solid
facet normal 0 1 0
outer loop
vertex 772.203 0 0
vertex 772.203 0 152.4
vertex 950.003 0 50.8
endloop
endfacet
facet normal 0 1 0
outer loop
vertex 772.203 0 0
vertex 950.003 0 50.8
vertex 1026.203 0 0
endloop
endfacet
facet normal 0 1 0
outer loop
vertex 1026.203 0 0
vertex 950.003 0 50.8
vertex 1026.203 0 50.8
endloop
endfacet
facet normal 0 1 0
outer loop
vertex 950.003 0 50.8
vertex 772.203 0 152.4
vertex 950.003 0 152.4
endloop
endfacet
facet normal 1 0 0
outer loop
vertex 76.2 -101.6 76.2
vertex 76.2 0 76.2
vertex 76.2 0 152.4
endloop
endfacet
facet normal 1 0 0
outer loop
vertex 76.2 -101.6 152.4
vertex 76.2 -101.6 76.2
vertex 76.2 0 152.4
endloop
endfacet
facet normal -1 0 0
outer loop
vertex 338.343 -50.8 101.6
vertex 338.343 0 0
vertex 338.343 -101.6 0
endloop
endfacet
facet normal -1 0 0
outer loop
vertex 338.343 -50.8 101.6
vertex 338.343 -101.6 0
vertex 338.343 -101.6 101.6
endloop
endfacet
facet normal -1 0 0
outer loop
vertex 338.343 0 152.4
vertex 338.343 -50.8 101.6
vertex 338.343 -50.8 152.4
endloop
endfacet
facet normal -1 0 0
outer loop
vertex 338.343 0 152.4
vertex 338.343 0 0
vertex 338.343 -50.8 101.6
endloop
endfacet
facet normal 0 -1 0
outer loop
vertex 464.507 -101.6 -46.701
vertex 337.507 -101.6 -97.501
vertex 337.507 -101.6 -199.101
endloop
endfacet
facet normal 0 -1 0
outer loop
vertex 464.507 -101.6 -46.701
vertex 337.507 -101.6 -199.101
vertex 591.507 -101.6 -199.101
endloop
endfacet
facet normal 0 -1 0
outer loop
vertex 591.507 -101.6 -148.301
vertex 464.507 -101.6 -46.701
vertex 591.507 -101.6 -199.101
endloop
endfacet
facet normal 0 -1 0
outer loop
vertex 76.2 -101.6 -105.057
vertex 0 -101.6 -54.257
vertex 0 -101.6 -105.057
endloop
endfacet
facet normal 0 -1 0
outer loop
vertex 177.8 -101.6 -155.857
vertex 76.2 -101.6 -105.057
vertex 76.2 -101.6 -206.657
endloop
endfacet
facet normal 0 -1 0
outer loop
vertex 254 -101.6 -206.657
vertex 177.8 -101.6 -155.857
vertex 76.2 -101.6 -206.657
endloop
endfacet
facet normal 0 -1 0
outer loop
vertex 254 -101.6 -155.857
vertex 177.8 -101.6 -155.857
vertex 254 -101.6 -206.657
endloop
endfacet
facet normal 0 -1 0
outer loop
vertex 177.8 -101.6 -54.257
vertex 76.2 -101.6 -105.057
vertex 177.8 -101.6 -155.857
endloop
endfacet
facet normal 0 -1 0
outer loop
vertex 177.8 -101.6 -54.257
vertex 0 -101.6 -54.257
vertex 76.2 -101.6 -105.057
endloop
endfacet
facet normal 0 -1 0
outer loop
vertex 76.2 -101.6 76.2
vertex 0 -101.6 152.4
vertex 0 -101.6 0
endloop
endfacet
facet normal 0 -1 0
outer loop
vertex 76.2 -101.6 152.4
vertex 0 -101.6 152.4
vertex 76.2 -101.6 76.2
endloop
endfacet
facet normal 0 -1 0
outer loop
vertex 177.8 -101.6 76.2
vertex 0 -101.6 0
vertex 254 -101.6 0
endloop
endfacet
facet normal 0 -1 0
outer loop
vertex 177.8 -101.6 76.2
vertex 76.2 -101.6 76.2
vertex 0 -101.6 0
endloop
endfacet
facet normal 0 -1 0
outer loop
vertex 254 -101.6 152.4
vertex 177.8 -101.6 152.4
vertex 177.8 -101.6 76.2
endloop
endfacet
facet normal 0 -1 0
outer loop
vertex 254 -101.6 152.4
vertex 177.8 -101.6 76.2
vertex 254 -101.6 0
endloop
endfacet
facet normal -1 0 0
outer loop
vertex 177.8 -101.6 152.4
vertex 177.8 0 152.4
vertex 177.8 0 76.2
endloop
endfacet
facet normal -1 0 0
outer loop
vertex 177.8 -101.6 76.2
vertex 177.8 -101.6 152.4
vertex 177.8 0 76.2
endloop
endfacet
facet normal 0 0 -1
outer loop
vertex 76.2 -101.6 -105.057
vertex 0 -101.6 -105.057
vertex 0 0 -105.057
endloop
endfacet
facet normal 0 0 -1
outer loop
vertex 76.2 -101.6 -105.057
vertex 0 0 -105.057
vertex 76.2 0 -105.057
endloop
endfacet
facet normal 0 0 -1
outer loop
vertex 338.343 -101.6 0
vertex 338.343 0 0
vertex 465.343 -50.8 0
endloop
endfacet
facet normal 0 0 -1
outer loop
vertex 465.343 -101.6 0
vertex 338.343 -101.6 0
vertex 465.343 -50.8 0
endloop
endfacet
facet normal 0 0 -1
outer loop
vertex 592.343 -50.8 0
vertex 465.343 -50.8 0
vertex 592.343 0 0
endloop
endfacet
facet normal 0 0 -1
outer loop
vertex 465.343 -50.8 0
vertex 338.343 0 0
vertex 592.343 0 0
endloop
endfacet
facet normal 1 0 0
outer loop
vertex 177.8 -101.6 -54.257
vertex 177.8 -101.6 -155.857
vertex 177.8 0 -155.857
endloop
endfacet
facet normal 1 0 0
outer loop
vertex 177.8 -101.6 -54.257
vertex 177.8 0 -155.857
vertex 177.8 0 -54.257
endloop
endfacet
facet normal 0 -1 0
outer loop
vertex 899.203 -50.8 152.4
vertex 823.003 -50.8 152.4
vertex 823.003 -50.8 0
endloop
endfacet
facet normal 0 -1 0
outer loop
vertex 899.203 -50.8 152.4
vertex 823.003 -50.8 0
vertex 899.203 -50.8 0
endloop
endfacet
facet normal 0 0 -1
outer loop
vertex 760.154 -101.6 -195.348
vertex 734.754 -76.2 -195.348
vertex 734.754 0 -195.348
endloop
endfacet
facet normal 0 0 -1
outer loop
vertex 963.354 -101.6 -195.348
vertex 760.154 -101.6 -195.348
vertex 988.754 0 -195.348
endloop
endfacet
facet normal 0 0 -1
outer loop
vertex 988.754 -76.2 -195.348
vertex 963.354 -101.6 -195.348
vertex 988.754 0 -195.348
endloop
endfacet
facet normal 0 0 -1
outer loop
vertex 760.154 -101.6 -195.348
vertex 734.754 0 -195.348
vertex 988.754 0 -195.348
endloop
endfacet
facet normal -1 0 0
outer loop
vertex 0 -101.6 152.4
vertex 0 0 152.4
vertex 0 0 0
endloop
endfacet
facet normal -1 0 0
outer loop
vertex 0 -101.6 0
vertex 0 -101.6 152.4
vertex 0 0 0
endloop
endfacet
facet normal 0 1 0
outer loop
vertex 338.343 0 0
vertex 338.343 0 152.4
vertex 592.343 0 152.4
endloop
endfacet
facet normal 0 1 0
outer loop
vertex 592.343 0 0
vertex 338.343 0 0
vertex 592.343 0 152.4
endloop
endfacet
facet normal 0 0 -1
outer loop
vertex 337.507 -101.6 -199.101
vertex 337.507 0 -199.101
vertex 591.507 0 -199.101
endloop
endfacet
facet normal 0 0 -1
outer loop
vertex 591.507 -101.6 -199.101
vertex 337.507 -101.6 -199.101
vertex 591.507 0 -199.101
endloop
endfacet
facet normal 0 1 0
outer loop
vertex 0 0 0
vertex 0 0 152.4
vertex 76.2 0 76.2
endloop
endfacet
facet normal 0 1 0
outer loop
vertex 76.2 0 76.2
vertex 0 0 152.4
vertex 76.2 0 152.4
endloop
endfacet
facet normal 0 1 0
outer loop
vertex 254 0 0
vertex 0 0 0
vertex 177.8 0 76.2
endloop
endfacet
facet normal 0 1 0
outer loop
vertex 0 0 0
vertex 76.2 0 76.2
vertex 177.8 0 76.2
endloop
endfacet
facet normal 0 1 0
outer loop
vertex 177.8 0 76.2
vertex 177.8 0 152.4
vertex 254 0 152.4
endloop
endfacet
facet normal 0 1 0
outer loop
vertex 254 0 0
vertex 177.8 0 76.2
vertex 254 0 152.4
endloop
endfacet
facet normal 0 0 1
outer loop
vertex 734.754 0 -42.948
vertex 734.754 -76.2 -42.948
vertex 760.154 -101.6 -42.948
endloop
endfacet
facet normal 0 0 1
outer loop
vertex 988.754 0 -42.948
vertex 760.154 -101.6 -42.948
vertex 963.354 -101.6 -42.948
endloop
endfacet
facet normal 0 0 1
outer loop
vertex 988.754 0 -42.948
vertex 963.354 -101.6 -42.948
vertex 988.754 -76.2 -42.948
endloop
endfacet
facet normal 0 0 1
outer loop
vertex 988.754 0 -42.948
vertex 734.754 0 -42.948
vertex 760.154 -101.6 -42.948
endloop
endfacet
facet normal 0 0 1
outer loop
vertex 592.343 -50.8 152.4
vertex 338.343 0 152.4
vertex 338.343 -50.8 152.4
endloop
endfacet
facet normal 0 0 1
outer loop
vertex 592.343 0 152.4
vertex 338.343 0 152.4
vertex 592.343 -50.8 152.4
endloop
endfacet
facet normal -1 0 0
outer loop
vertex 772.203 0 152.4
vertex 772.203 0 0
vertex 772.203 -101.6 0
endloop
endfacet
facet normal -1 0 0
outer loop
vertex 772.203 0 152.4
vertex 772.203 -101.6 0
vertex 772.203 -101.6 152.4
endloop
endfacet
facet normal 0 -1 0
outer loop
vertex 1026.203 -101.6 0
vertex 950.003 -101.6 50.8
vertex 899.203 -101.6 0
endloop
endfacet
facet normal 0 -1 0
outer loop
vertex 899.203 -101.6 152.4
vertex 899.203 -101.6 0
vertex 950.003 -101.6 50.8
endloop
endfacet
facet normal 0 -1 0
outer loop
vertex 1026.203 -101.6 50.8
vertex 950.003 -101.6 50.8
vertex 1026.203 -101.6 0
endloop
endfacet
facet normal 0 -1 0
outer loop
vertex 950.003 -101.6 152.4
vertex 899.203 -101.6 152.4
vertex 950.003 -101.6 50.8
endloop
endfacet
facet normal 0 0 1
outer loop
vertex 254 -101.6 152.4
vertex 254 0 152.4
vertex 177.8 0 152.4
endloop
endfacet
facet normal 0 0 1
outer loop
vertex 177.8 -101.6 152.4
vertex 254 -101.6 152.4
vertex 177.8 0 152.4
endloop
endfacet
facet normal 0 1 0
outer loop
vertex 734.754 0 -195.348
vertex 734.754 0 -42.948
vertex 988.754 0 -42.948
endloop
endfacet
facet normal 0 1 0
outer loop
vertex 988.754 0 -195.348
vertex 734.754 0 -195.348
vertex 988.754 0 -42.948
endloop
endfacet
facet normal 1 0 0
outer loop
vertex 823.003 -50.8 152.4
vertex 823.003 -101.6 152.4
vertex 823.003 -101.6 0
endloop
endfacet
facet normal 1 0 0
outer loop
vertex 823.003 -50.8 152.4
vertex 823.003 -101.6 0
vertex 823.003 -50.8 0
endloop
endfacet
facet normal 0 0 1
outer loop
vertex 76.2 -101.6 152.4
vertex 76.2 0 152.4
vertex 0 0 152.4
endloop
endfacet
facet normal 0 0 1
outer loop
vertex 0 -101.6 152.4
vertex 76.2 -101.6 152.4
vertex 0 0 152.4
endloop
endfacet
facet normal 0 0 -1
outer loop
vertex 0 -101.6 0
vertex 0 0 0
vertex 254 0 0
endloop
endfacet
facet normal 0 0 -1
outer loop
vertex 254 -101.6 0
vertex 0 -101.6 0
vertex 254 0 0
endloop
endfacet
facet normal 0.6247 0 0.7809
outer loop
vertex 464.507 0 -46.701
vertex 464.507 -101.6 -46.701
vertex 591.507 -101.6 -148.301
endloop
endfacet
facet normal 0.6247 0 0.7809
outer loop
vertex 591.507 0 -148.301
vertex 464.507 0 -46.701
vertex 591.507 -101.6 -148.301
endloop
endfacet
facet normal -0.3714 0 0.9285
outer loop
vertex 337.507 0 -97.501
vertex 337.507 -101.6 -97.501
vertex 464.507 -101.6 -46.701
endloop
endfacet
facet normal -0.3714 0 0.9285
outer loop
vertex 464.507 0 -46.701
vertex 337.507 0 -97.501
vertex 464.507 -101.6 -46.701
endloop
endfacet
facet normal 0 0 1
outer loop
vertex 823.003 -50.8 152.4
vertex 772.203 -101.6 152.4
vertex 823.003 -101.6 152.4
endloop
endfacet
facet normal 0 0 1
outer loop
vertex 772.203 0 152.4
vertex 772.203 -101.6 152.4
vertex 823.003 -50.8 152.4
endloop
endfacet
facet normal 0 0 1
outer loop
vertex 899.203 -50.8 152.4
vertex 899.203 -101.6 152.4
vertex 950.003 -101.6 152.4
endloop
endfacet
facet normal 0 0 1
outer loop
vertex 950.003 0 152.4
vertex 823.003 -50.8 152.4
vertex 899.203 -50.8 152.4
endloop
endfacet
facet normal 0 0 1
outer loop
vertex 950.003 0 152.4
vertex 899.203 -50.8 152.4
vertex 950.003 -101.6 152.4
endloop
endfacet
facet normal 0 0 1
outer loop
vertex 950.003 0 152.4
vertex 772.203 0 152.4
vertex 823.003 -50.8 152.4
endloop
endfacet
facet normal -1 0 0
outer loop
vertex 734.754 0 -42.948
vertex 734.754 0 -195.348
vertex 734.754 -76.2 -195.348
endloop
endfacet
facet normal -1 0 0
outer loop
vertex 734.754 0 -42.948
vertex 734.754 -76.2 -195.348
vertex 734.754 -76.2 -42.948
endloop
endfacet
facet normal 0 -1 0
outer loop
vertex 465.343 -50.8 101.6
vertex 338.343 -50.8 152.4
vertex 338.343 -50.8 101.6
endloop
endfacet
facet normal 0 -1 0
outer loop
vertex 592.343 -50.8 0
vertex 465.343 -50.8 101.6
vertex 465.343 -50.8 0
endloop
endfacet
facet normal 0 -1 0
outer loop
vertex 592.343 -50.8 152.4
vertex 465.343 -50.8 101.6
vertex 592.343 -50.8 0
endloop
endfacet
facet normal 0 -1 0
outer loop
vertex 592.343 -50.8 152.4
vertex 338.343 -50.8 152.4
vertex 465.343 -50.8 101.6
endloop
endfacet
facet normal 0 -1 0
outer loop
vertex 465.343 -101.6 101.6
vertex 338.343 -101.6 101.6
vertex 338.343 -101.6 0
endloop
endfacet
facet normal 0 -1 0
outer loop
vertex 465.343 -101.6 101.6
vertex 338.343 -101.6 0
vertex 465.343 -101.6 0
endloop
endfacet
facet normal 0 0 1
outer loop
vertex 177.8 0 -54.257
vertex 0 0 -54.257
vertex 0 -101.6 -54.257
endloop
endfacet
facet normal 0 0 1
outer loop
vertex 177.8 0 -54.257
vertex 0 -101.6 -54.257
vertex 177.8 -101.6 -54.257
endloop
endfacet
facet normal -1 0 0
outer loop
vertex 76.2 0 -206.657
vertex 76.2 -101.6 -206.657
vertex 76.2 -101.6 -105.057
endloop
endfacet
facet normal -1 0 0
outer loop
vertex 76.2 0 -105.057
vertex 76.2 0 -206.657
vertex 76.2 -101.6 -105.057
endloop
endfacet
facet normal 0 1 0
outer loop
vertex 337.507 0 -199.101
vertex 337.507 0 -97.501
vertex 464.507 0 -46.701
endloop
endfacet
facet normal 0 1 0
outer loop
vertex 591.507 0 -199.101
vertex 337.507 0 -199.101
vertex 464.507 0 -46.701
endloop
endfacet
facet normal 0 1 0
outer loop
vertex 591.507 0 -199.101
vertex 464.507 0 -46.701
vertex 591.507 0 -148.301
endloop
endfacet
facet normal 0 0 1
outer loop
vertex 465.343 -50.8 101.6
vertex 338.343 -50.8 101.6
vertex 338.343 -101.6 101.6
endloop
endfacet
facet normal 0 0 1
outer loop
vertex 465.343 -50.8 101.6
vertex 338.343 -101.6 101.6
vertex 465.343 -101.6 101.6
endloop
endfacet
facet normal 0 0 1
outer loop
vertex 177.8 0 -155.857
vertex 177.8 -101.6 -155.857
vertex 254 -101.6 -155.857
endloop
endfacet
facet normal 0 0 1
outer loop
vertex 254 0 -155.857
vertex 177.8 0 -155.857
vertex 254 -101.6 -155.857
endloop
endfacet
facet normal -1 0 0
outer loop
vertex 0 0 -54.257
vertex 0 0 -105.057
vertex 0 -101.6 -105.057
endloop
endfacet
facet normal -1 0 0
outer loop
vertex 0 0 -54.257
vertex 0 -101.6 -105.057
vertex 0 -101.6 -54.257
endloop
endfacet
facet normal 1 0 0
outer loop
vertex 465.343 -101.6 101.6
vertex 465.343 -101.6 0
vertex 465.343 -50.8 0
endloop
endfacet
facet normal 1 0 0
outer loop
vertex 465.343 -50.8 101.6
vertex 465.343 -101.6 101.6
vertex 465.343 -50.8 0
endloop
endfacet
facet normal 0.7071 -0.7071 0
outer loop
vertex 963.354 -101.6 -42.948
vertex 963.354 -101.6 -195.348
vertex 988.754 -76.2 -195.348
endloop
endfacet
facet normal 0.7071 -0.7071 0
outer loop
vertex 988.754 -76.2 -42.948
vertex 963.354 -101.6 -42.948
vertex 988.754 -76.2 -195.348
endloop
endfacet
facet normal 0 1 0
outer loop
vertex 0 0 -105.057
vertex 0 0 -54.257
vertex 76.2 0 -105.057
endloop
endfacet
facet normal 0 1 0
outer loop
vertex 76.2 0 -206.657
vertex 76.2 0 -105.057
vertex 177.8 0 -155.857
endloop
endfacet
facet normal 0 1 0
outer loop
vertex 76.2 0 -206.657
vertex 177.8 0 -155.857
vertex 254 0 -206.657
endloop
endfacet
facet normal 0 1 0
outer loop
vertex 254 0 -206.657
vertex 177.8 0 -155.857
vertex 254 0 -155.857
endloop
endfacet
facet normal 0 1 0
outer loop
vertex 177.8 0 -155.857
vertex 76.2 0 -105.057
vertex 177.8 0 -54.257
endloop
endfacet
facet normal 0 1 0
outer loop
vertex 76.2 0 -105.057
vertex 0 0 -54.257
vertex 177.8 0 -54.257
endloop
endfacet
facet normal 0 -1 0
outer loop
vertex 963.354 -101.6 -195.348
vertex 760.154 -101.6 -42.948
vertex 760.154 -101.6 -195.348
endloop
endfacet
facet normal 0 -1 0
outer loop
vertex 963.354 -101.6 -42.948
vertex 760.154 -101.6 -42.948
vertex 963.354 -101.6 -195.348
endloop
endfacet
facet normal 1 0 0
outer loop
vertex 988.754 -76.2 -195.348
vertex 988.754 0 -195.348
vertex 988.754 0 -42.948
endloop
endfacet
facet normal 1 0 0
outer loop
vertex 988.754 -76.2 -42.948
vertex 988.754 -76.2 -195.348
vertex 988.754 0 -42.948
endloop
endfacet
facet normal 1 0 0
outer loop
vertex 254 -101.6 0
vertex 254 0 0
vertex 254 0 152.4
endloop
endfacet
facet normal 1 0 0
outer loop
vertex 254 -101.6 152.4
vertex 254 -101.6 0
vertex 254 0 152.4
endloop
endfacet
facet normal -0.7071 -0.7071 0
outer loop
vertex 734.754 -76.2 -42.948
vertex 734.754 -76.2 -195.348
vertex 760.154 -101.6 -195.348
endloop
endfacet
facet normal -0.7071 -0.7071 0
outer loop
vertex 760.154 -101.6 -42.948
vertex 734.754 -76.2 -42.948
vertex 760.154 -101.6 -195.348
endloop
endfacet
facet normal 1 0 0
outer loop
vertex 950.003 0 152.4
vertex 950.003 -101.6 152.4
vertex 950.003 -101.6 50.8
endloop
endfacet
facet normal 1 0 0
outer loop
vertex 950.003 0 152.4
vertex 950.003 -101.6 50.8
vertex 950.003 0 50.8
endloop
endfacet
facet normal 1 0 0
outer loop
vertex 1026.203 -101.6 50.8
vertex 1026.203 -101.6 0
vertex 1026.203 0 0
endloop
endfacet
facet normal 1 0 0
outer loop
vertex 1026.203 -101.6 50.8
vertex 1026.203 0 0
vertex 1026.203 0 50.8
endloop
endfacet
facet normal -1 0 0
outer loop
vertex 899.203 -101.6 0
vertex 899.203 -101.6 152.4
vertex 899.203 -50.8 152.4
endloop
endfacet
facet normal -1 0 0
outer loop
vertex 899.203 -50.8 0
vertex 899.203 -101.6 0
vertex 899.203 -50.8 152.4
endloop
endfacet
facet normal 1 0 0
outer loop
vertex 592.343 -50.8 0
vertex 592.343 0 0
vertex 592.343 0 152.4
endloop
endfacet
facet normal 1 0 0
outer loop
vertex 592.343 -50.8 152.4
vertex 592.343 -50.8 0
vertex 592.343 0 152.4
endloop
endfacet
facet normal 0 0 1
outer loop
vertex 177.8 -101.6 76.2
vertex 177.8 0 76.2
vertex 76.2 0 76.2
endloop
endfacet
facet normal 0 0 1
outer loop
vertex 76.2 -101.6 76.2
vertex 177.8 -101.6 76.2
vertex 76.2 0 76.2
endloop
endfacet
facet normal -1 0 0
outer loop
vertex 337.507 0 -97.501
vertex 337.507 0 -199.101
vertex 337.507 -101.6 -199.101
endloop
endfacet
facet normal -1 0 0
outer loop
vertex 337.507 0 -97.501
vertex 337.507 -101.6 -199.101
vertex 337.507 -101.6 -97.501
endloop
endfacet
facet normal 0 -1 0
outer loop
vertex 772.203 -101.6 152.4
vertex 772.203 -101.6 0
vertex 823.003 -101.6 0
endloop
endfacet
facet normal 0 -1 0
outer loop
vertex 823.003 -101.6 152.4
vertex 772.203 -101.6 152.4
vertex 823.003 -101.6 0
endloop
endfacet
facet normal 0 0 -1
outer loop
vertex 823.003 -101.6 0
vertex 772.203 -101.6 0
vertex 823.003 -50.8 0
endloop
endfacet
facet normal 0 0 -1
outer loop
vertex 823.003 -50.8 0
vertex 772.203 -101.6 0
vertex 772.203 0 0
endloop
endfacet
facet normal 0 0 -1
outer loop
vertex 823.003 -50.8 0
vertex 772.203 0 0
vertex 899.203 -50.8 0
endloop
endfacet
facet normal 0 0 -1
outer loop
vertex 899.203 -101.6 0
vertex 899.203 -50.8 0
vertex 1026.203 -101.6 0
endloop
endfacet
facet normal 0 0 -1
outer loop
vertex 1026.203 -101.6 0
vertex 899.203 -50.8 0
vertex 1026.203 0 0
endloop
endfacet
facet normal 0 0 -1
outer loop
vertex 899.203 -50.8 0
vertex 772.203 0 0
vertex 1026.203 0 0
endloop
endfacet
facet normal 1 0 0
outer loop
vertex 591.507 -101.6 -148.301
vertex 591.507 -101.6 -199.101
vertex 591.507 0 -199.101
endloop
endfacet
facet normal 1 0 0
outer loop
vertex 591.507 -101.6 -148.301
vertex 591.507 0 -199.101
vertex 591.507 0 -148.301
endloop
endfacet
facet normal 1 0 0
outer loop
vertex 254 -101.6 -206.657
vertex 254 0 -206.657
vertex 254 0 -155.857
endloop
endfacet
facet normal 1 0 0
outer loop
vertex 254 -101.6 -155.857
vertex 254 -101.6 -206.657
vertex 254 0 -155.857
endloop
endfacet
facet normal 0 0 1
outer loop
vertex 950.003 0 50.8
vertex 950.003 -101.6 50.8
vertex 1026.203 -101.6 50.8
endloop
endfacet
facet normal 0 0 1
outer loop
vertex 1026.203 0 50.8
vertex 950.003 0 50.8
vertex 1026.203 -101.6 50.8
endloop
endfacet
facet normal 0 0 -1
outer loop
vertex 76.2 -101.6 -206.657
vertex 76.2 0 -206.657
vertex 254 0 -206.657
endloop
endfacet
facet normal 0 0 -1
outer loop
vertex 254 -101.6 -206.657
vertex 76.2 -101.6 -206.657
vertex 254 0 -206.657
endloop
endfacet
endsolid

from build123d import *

# Parameters (mm, degrees)
F1_DEPTH  = 101.6
F2_W      = 254
F2_H      = 152.4
F3_DEPTH  = 101.6
F4_W      = 127
F4_H      = 50.8
F5_DEPTH  = 152.4
F6_W      = 127
F6_H      = 50.8
F7_DEPTH  = 50.8
F8_W      = 254
F8_H      = 152.4
F9_DEPTH  = 101.6
F10_W     = 76.2
F10_H     = 50.8
F11_DEPTH = 152.4
F12_W     = 76.2
F12_H     = 101.6
F13_DEPTH = 101.6
F14_W     = 254
F14_H     = 152.4
F15_DEPTH = 101.6
F16_W     = 76.2
F16_H     = 101.6
F17_DEPTH = 101.6
F18_W     = 76.2
F18_H     = 101.6
F19_DEPTH = 101.6
F20_W     = 254
F20_H     = 152.4
F21_DEPTH = 101.6
F23_DEPTH = 101.6
F25_DEPTH = 101.6
F26_W     = 254
F26_H     = 152.4
F27_DEPTH = 101.6
F29_DEPTH = 152.4


with BuildPart() as f1:
    # F0 (on Front) → F1 (new body)
    with BuildSketch(Plane.XZ):
        Polygon((0, 152.4), (0, 0), (254, 0), (254, 152.4), (177.8, 152.4), (177.8, 76.2), (76.2, 76.2), (76.2, 152.4), align=None)
    extrude(amount=F1_DEPTH)


with BuildPart() as f3:
    # F2 (on Front) → F3 (new body)
    with BuildSketch(Plane.XZ):
        with Locations((465.342793, 76.2)):
            Rectangle(F2_W, F2_H)
    extrude(amount=F3_DEPTH)

    # F4 (on face) → F5 (cut)
    with BuildSketch(Plane.XY.offset(152.4)):
        with Locations((528.842793, -76.2)):
            Rectangle(F4_W, F4_H)
    extrude(amount=-F5_DEPTH, mode=Mode.SUBTRACT)

    # F6 (on face) → F7 (cut)
    with BuildSketch(Plane.XY.offset(152.4)):
        with Locations((401.842793, -76.2)):
            Rectangle(F6_W, F6_H)
    extrude(amount=-F7_DEPTH, mode=Mode.SUBTRACT)


with BuildPart() as f9:
    # F8 (on Front) → F9 (new body)
    with BuildSketch(Plane.XZ):
        with Locations((899.202911, 76.2)):
            Rectangle(F8_W, F8_H)
    extrude(amount=F9_DEPTH)

    # F10 (on face) → F11 (cut)
    with BuildSketch(Plane.XY.offset(152.4)):
        with Locations((861.102911, -76.2)):
            Rectangle(F10_W, F10_H)
    extrude(amount=-F11_DEPTH, mode=Mode.SUBTRACT)

    # F12 (on face) → F13 (cut)
    with BuildSketch(Plane.XY.offset(152.4)):
        with Locations((988.102911, -50.8)):
            Rectangle(F12_W, F12_H)
    extrude(amount=-F13_DEPTH, mode=Mode.SUBTRACT)


with BuildPart() as f15:
    # F14 (on Front) → F15 (new body)
    with BuildSketch(Plane.XZ):
        with Locations((127, -130.457395)):
            Rectangle(F14_W, F14_H)
    extrude(amount=F15_DEPTH)

    # F16 (on face) → F17 (cut)
    with BuildSketch(Plane.XZ.offset(101.6)):
        with Locations((38.1, -155.857395)):
            Rectangle(F16_W, F16_H)
    extrude(amount=-F17_DEPTH, mode=Mode.SUBTRACT)

    # F18 (on face) → F19 (cut)
    with BuildSketch(Plane.XZ.offset(101.6)):
        with Locations((215.9, -105.057395)):
            Rectangle(F18_W, F18_H)
    extrude(amount=-F19_DEPTH, mode=Mode.SUBTRACT)


with BuildPart() as f21:
    # F20 (on Front) → F21 (new body)
    with BuildSketch(Plane.XZ):
        with Locations((464.506865, -122.901041)):
            Rectangle(F20_W, F20_H)
    extrude(amount=F21_DEPTH)

    # F22 (on face) → F23 (cut)
    with BuildSketch(Plane.XZ.offset(101.6)):
        Polygon((464.506865, -46.701041), (337.506865, -46.701041), (337.506865, -97.501041), align=None)
    extrude(amount=-F23_DEPTH, mode=Mode.SUBTRACT)

    # F24 (on face) → F25 (cut)
    with BuildSketch(Plane.XZ.offset(101.6)):
        Polygon((591.506865, -148.301041), (591.506865, -46.701041), (464.506865, -46.701041), align=None)
    extrude(amount=-F25_DEPTH, mode=Mode.SUBTRACT)


with BuildPart() as f27:
    # F26 (on Front) → F27 (new body)
    with BuildSketch(Plane.XZ):
        with Locations((861.753938, -119.147837)):
            Rectangle(F26_W, F26_H)
    extrude(amount=F27_DEPTH)

    # F28 (on face) → F29 (cut)
    with BuildSketch(Plane(origin=(0, 0, -195.347837), x_dir=(1, 0, 0), z_dir=(0, 0, -1))):
        Polygon((760.153938, 101.6), (734.753938, 101.6), (734.753938, 76.2), align=None)
        Polygon((988.753938, 101.6), (963.353938, 101.6), (988.753938, 76.2), align=None)
    extrude(amount=-F29_DEPTH, mode=Mode.SUBTRACT)


solid = Compound([f1.part, f3.part, f9.part, f15.part, f21.part, f27.part])
